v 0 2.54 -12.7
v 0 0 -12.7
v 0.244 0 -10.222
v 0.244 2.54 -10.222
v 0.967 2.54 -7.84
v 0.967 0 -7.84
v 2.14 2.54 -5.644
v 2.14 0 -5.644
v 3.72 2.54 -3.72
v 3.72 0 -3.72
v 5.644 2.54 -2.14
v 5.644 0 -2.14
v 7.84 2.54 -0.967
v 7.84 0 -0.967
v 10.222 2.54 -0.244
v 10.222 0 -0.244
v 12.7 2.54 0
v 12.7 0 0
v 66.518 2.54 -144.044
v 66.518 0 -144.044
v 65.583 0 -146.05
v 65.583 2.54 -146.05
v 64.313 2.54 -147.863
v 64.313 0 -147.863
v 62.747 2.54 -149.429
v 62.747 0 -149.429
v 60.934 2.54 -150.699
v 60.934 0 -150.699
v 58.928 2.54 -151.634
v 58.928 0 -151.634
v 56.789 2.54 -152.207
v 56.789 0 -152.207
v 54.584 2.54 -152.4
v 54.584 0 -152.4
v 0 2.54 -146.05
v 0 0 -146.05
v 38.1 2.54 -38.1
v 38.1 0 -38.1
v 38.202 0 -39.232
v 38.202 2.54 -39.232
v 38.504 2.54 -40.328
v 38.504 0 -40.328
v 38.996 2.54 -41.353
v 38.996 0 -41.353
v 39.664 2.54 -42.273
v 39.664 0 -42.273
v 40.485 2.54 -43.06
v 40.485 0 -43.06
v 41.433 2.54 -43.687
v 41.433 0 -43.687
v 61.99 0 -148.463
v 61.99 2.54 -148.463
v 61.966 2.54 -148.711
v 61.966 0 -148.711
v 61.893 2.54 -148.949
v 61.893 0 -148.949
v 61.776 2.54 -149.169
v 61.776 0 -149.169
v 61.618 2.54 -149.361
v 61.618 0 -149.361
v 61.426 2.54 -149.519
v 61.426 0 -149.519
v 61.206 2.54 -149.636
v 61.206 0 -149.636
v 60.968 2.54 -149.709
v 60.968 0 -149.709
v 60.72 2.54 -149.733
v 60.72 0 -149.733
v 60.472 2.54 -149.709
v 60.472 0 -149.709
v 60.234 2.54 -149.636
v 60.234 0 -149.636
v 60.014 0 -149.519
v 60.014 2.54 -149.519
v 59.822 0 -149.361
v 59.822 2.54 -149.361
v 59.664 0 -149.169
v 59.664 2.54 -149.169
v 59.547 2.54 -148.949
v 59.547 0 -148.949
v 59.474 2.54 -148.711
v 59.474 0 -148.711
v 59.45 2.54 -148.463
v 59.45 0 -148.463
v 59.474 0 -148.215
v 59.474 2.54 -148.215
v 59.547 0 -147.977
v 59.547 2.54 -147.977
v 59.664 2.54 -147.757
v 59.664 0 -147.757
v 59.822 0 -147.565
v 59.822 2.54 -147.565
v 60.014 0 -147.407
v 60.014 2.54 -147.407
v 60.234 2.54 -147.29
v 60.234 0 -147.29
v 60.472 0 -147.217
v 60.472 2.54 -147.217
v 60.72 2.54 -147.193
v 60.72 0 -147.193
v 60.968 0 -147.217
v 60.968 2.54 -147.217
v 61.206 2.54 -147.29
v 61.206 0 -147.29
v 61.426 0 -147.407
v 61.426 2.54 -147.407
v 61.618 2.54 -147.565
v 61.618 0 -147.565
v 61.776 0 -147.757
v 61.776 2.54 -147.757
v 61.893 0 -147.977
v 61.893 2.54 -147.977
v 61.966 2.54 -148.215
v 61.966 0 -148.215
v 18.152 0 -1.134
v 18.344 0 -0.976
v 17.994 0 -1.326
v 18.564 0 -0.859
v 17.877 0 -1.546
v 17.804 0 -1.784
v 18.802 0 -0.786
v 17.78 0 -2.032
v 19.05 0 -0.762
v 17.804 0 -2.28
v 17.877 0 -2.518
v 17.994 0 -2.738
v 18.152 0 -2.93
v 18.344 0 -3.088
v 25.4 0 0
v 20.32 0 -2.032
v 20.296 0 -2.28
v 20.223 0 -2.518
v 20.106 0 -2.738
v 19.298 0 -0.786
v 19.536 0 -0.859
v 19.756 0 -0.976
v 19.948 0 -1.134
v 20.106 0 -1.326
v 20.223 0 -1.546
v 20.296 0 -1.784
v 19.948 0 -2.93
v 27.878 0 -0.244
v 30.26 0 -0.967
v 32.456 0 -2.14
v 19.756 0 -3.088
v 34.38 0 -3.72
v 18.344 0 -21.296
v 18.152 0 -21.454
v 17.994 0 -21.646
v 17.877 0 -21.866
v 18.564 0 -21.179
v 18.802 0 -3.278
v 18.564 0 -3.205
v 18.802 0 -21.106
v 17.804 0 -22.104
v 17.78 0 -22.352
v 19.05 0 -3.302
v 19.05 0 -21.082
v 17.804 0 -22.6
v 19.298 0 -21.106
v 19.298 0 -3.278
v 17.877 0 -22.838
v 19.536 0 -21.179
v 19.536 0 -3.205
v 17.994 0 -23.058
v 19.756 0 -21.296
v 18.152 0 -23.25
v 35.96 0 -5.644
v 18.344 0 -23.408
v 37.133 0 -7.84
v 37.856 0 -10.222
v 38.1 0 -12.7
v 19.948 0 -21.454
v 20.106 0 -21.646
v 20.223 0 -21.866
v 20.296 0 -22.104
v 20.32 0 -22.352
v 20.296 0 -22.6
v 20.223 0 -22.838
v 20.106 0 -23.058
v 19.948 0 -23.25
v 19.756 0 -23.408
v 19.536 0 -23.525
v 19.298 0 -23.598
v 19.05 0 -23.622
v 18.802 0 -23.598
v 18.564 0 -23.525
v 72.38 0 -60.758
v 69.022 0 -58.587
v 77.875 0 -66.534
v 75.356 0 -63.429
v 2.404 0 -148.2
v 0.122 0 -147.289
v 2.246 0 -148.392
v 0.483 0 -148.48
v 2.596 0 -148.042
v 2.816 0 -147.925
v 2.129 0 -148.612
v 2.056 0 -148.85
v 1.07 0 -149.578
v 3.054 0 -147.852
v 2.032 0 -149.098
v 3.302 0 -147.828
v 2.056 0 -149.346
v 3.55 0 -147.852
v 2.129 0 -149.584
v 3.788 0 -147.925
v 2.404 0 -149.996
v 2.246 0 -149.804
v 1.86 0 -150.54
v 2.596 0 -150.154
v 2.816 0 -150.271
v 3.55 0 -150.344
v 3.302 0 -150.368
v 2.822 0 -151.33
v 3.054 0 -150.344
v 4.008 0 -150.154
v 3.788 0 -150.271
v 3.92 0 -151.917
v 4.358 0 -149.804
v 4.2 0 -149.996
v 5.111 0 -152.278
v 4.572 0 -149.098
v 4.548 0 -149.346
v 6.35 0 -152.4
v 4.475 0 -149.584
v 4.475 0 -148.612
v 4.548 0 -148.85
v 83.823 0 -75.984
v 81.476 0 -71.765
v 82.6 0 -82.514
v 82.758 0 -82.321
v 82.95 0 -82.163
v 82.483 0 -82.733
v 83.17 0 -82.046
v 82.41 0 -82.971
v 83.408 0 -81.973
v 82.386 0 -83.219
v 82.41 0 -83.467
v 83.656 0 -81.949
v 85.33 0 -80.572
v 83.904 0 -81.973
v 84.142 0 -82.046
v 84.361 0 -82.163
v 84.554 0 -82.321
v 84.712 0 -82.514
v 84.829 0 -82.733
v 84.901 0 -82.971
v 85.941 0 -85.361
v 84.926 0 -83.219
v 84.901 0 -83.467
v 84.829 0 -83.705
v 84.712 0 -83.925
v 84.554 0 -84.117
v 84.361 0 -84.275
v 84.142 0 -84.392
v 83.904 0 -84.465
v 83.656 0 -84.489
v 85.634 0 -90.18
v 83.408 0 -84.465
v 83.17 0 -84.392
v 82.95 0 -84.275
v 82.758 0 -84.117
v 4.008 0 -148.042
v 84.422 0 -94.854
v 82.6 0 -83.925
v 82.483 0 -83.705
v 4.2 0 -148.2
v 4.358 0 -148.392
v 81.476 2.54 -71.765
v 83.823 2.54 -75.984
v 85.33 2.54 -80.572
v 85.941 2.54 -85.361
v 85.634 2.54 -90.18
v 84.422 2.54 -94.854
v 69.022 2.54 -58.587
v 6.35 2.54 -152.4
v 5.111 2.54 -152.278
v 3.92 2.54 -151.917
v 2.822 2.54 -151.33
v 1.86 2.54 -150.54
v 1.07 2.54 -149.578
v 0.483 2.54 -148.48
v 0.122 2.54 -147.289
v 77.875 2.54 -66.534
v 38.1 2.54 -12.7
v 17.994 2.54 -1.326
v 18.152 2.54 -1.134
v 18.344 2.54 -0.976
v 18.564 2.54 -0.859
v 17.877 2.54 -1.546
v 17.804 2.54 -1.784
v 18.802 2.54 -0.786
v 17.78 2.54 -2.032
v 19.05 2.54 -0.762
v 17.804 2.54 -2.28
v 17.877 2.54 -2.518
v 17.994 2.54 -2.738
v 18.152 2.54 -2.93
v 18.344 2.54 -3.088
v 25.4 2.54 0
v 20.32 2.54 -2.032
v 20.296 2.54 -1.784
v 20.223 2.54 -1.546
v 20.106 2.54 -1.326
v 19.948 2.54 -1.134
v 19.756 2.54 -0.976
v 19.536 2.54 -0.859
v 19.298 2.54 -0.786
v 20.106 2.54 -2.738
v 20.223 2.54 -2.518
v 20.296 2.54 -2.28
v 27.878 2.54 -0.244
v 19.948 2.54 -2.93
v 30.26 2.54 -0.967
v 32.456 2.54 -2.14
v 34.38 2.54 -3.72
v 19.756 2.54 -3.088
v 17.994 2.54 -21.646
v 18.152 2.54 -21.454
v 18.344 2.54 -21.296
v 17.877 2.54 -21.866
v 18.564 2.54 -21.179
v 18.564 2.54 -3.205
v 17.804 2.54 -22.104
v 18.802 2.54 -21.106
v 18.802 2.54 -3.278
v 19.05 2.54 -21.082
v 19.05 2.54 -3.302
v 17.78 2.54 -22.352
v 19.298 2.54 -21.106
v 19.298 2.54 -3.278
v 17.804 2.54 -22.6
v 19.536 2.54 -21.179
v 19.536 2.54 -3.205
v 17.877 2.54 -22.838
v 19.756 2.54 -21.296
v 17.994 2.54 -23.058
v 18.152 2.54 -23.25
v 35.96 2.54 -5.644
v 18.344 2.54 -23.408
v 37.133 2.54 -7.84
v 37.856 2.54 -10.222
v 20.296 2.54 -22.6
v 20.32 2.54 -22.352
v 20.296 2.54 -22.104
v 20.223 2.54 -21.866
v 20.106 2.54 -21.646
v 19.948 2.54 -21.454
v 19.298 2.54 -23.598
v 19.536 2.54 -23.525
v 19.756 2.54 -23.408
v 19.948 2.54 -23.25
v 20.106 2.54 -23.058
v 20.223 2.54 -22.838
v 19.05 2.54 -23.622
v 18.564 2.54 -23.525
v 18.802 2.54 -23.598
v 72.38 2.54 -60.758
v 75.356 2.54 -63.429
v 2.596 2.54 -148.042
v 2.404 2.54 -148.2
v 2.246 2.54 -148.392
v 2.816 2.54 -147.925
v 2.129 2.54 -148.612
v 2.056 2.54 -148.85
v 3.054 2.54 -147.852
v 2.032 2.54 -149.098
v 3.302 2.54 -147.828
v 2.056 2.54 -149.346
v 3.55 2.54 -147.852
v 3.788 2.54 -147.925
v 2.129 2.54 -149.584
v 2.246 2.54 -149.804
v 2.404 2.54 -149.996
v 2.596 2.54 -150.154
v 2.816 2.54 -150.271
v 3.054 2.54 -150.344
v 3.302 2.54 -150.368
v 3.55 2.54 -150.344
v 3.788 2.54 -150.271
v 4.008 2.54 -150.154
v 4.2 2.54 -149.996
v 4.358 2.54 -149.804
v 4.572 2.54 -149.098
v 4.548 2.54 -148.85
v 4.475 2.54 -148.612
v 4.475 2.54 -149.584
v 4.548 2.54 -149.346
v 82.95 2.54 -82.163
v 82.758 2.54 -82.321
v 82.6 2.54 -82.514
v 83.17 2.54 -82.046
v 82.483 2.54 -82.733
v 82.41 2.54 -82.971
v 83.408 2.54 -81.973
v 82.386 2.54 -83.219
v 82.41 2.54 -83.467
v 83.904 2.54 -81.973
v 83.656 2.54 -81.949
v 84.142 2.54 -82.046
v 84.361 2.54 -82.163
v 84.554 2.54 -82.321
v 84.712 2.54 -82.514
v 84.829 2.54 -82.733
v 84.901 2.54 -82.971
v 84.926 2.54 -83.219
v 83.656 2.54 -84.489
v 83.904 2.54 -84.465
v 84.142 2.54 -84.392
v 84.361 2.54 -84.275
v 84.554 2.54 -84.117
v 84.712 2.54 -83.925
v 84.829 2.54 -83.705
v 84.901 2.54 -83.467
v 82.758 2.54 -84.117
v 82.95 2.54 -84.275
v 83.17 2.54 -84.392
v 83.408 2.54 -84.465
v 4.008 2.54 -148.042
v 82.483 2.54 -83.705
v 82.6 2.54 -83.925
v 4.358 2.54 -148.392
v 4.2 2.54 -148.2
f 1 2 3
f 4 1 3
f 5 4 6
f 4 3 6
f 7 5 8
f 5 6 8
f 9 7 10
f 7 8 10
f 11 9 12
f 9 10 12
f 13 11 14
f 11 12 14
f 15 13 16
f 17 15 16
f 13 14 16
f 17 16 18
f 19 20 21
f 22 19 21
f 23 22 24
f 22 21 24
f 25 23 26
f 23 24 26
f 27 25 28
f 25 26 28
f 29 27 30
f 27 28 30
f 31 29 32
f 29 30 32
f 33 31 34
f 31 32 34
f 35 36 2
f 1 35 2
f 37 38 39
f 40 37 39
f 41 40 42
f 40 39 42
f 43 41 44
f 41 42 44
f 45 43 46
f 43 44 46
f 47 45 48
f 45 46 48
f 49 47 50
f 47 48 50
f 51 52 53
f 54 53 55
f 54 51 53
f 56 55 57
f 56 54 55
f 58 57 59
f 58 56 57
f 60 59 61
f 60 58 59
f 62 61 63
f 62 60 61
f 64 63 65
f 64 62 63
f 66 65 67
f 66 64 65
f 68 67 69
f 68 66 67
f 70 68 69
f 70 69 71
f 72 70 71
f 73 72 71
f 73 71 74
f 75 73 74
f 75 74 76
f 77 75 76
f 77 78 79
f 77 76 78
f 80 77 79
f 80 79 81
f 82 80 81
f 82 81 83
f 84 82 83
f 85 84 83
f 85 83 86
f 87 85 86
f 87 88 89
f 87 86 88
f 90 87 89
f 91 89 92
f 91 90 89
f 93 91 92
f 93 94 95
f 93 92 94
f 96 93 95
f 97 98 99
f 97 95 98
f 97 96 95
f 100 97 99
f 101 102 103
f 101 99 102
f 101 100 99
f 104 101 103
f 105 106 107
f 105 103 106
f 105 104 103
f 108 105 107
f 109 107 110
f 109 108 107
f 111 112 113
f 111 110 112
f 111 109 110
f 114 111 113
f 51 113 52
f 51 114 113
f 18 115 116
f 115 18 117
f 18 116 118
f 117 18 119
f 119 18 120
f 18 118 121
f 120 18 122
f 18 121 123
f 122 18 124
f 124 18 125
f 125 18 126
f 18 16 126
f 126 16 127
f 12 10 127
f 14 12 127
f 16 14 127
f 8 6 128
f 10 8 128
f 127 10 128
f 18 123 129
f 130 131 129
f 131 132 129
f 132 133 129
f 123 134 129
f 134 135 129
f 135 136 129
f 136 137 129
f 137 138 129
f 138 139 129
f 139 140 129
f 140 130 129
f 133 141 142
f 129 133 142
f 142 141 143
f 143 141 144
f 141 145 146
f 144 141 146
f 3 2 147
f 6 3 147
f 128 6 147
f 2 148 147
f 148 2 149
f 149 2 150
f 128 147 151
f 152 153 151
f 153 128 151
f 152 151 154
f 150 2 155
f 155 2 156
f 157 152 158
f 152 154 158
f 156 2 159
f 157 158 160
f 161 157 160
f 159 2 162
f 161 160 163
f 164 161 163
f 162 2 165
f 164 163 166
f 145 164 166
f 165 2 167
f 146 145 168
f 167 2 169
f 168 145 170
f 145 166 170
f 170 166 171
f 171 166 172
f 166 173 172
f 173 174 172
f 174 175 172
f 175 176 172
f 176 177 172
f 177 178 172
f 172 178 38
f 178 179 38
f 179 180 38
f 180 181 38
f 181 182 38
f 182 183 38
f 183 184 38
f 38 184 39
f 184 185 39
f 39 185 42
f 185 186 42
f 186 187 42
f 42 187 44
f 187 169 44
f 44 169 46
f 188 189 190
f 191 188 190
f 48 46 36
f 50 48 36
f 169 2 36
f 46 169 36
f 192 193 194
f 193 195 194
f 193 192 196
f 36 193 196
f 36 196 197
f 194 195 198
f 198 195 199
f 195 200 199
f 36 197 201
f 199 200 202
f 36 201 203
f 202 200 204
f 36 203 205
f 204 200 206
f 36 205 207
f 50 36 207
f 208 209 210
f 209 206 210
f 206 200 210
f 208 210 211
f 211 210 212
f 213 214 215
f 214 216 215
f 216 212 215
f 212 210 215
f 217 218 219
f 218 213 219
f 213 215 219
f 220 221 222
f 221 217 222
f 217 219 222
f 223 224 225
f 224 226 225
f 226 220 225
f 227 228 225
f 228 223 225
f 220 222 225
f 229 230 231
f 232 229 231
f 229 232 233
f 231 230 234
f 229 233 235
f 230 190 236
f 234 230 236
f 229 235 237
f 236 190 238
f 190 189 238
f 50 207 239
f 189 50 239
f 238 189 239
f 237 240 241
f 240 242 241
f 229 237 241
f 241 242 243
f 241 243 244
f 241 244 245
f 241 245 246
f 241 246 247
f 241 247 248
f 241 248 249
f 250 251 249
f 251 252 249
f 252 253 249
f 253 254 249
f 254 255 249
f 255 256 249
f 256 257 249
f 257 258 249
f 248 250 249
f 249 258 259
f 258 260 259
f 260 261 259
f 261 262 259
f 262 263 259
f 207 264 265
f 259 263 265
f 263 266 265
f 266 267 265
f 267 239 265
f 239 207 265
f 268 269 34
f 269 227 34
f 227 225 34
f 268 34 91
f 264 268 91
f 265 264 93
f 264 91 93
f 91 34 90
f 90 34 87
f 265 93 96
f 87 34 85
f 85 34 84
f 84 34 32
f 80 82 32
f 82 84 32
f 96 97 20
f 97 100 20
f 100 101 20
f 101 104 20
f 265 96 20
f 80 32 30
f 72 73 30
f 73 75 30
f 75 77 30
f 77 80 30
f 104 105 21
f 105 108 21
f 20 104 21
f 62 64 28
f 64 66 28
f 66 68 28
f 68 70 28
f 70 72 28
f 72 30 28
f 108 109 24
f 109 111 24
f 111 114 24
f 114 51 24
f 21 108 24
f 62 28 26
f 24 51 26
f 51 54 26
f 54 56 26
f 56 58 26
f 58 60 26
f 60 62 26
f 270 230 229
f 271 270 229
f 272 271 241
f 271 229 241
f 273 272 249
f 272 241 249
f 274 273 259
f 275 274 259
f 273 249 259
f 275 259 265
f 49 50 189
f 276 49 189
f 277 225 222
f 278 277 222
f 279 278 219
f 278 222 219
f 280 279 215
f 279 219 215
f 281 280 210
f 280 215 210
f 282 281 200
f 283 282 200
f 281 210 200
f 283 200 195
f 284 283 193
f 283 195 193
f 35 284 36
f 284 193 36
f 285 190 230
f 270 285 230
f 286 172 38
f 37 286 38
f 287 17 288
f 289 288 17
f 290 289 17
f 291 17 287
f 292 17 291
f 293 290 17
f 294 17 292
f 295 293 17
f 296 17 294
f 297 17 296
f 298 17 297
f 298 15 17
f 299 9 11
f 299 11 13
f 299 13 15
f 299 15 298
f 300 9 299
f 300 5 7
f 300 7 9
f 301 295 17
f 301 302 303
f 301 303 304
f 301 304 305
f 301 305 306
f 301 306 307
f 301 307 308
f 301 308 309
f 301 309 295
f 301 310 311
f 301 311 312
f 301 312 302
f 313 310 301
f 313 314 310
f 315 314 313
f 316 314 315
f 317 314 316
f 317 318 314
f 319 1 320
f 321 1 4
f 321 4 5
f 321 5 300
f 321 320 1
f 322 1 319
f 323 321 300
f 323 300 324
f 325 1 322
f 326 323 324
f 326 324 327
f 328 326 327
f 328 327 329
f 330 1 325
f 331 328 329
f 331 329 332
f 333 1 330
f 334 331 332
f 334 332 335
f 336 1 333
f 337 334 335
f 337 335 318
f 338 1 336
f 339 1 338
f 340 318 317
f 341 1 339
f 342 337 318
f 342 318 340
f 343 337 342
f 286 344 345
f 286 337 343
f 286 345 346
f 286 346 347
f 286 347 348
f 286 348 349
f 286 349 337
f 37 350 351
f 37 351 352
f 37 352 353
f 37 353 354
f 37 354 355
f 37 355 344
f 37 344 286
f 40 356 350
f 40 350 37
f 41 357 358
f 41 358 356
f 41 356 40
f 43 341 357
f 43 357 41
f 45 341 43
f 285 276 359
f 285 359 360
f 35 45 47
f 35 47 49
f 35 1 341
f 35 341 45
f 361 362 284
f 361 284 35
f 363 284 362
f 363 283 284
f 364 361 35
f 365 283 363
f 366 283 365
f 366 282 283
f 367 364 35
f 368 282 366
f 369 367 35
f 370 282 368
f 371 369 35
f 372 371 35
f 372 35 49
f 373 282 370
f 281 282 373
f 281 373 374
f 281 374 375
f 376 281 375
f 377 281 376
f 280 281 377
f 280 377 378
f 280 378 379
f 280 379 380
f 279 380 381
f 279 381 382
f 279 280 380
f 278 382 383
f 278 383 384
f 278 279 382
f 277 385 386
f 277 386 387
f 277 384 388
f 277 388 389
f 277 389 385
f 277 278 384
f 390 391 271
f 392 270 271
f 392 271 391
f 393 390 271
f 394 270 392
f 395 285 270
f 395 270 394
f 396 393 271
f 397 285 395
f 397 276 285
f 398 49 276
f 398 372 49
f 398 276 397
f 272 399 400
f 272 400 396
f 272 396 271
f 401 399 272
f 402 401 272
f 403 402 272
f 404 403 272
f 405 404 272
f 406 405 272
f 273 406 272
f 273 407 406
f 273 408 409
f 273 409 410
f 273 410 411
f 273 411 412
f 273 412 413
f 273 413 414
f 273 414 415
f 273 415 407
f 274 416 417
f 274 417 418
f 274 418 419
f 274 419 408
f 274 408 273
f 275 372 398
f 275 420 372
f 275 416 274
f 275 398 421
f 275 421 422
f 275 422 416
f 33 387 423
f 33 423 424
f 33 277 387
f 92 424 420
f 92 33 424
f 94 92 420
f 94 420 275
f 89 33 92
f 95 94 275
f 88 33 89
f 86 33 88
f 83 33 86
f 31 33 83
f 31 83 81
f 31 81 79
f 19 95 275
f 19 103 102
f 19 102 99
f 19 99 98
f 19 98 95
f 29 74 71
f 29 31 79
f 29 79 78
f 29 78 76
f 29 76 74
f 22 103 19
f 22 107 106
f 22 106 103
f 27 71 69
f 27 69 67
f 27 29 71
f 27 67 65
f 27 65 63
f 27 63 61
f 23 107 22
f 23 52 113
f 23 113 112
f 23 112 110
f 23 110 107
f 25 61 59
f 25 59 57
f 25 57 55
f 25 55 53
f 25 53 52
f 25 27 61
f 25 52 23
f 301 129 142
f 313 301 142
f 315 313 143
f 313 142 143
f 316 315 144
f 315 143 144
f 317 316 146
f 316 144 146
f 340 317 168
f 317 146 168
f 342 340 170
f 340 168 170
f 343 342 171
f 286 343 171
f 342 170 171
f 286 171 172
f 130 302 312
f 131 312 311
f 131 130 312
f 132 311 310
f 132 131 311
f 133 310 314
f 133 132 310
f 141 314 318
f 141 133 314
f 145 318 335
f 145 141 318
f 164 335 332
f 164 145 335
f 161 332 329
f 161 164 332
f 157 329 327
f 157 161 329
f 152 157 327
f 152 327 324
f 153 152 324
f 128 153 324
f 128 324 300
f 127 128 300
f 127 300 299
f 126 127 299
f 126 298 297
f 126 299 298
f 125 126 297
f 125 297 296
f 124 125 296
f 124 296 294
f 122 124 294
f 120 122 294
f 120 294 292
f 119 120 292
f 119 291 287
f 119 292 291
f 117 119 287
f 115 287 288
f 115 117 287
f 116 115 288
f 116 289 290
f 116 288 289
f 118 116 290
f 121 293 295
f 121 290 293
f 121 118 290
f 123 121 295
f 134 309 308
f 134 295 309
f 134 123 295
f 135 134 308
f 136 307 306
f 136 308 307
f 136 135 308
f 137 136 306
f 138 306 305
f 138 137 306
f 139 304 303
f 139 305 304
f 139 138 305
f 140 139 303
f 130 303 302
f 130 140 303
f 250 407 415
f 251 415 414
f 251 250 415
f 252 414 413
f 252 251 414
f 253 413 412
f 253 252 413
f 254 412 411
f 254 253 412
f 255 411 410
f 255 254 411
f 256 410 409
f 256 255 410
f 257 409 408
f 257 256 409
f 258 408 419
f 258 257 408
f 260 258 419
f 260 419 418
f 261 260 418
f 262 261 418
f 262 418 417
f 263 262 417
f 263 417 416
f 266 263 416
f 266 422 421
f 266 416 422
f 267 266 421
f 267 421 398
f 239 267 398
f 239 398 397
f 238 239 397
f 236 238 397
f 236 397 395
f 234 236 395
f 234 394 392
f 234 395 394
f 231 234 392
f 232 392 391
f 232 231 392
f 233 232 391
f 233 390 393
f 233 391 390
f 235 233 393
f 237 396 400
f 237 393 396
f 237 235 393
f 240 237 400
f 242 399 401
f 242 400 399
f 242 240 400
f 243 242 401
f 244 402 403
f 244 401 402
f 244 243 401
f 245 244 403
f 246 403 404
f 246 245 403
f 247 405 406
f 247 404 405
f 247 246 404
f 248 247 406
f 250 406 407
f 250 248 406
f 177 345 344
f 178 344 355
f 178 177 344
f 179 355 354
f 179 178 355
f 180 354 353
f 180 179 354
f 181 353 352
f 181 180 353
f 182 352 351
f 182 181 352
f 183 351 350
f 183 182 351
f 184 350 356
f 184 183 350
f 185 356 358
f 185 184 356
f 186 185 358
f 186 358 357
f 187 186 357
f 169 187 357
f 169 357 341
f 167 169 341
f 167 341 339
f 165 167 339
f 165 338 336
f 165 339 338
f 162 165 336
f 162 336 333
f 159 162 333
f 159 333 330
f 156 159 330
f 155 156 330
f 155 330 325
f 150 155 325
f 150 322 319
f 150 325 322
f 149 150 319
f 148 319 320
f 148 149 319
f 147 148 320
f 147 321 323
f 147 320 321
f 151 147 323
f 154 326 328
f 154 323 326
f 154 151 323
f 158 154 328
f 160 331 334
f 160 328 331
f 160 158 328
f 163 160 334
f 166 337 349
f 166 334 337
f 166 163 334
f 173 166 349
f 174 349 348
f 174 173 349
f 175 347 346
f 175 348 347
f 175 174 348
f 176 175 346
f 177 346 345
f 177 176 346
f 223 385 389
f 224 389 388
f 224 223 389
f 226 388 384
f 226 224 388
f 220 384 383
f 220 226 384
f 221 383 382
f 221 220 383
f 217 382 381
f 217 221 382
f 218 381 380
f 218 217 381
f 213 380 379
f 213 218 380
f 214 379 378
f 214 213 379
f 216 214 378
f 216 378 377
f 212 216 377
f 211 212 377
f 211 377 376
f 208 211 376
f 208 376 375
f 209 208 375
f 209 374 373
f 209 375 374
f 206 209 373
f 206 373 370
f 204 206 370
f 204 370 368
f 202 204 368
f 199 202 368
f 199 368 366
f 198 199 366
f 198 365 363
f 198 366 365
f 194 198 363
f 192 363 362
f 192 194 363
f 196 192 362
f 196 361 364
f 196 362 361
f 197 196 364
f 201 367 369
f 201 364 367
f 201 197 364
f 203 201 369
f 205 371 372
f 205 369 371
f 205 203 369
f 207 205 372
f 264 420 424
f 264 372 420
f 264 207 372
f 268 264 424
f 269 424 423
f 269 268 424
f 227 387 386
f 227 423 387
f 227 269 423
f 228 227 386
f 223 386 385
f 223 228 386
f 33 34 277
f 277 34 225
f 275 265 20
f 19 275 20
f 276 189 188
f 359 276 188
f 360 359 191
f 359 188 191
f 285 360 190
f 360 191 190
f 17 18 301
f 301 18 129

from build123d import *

# Parameters (mm, degrees)
OHGC_BASE_DEPTH  = 2.54
SKETCH7_R        = 1.27
SCREWHOLES_DEPTH = 3.54


with BuildPart() as part:
    # Sketch2 → OHGC BASE (new body)
    with BuildSketch(Plane(origin=(0, 0, 0), x_dir=(1, 0, 0), z_dir=(0, 1, 0))):
        with BuildLine():
            Line((12.7, 0), (25.4, 0))
            ThreePointArc((25.4, 0), (34.380256121, 3.719743879), (38.1, 12.7))
            Line((38.1, 12.7), (38.1, 38.1))
            ThreePointArc((38.1, 38.1), (38.996434372, 41.352863652), (41.432636832, 43.68730879))
            Line((41.432636832, 43.68730879), (69.022459682, 58.586881809))
            ThreePointArc((69.022459682, 58.586881809), (73.920701901, 62.034864891), (77.875264971, 66.534064274))
            Line((77.875264971, 66.534064274), (81.475778144, 71.764628765))
            ThreePointArc((81.475778144, 71.764628765), (85.749269843, 82.951996559), (84.42171275, 94.853993098))
            Line((84.42171275, 94.853993098), (66.518139685, 144.04365582))
            ThreePointArc((66.518139685, 144.04365582), (61.868464143, 150.103230962), (54.584043401, 152.4))
            Line((54.584043401, 152.4), (6.35, 152.4))
            ThreePointArc((6.35, 152.4), (1.859871939, 150.540128061), (0, 146.05))
            Line((0, 146.05), (0, 12.7))
            ThreePointArc((0, 12.7), (3.719743879, 3.719743879), (12.7, 0))
        make_face()
    extrude(amount=OHGC_BASE_DEPTH)

    # Sketch7 → Screwholes (cut, through all)
    with BuildSketch(Plane(origin=(0, 0, 0), x_dir=(1, 0, 0), z_dir=(0, 1, 0))):
        with Locations((3.302, 149.098)):
            Circle(SKETCH7_R)
        with Locations((60.719962059, 148.463)):
            Circle(SKETCH7_R)
        with Locations((83.655901234, 83.21908607)):
            Circle(SKETCH7_R)
        with Locations((19.05, 22.352)):
            Circle(SKETCH7_R)
        with Locations((19.05, 2.032)):
            Circle(SKETCH7_R)
    extrude(amount=SCREWHOLES_DEPTH, mode=Mode.SUBTRACT)


solid = part.part
